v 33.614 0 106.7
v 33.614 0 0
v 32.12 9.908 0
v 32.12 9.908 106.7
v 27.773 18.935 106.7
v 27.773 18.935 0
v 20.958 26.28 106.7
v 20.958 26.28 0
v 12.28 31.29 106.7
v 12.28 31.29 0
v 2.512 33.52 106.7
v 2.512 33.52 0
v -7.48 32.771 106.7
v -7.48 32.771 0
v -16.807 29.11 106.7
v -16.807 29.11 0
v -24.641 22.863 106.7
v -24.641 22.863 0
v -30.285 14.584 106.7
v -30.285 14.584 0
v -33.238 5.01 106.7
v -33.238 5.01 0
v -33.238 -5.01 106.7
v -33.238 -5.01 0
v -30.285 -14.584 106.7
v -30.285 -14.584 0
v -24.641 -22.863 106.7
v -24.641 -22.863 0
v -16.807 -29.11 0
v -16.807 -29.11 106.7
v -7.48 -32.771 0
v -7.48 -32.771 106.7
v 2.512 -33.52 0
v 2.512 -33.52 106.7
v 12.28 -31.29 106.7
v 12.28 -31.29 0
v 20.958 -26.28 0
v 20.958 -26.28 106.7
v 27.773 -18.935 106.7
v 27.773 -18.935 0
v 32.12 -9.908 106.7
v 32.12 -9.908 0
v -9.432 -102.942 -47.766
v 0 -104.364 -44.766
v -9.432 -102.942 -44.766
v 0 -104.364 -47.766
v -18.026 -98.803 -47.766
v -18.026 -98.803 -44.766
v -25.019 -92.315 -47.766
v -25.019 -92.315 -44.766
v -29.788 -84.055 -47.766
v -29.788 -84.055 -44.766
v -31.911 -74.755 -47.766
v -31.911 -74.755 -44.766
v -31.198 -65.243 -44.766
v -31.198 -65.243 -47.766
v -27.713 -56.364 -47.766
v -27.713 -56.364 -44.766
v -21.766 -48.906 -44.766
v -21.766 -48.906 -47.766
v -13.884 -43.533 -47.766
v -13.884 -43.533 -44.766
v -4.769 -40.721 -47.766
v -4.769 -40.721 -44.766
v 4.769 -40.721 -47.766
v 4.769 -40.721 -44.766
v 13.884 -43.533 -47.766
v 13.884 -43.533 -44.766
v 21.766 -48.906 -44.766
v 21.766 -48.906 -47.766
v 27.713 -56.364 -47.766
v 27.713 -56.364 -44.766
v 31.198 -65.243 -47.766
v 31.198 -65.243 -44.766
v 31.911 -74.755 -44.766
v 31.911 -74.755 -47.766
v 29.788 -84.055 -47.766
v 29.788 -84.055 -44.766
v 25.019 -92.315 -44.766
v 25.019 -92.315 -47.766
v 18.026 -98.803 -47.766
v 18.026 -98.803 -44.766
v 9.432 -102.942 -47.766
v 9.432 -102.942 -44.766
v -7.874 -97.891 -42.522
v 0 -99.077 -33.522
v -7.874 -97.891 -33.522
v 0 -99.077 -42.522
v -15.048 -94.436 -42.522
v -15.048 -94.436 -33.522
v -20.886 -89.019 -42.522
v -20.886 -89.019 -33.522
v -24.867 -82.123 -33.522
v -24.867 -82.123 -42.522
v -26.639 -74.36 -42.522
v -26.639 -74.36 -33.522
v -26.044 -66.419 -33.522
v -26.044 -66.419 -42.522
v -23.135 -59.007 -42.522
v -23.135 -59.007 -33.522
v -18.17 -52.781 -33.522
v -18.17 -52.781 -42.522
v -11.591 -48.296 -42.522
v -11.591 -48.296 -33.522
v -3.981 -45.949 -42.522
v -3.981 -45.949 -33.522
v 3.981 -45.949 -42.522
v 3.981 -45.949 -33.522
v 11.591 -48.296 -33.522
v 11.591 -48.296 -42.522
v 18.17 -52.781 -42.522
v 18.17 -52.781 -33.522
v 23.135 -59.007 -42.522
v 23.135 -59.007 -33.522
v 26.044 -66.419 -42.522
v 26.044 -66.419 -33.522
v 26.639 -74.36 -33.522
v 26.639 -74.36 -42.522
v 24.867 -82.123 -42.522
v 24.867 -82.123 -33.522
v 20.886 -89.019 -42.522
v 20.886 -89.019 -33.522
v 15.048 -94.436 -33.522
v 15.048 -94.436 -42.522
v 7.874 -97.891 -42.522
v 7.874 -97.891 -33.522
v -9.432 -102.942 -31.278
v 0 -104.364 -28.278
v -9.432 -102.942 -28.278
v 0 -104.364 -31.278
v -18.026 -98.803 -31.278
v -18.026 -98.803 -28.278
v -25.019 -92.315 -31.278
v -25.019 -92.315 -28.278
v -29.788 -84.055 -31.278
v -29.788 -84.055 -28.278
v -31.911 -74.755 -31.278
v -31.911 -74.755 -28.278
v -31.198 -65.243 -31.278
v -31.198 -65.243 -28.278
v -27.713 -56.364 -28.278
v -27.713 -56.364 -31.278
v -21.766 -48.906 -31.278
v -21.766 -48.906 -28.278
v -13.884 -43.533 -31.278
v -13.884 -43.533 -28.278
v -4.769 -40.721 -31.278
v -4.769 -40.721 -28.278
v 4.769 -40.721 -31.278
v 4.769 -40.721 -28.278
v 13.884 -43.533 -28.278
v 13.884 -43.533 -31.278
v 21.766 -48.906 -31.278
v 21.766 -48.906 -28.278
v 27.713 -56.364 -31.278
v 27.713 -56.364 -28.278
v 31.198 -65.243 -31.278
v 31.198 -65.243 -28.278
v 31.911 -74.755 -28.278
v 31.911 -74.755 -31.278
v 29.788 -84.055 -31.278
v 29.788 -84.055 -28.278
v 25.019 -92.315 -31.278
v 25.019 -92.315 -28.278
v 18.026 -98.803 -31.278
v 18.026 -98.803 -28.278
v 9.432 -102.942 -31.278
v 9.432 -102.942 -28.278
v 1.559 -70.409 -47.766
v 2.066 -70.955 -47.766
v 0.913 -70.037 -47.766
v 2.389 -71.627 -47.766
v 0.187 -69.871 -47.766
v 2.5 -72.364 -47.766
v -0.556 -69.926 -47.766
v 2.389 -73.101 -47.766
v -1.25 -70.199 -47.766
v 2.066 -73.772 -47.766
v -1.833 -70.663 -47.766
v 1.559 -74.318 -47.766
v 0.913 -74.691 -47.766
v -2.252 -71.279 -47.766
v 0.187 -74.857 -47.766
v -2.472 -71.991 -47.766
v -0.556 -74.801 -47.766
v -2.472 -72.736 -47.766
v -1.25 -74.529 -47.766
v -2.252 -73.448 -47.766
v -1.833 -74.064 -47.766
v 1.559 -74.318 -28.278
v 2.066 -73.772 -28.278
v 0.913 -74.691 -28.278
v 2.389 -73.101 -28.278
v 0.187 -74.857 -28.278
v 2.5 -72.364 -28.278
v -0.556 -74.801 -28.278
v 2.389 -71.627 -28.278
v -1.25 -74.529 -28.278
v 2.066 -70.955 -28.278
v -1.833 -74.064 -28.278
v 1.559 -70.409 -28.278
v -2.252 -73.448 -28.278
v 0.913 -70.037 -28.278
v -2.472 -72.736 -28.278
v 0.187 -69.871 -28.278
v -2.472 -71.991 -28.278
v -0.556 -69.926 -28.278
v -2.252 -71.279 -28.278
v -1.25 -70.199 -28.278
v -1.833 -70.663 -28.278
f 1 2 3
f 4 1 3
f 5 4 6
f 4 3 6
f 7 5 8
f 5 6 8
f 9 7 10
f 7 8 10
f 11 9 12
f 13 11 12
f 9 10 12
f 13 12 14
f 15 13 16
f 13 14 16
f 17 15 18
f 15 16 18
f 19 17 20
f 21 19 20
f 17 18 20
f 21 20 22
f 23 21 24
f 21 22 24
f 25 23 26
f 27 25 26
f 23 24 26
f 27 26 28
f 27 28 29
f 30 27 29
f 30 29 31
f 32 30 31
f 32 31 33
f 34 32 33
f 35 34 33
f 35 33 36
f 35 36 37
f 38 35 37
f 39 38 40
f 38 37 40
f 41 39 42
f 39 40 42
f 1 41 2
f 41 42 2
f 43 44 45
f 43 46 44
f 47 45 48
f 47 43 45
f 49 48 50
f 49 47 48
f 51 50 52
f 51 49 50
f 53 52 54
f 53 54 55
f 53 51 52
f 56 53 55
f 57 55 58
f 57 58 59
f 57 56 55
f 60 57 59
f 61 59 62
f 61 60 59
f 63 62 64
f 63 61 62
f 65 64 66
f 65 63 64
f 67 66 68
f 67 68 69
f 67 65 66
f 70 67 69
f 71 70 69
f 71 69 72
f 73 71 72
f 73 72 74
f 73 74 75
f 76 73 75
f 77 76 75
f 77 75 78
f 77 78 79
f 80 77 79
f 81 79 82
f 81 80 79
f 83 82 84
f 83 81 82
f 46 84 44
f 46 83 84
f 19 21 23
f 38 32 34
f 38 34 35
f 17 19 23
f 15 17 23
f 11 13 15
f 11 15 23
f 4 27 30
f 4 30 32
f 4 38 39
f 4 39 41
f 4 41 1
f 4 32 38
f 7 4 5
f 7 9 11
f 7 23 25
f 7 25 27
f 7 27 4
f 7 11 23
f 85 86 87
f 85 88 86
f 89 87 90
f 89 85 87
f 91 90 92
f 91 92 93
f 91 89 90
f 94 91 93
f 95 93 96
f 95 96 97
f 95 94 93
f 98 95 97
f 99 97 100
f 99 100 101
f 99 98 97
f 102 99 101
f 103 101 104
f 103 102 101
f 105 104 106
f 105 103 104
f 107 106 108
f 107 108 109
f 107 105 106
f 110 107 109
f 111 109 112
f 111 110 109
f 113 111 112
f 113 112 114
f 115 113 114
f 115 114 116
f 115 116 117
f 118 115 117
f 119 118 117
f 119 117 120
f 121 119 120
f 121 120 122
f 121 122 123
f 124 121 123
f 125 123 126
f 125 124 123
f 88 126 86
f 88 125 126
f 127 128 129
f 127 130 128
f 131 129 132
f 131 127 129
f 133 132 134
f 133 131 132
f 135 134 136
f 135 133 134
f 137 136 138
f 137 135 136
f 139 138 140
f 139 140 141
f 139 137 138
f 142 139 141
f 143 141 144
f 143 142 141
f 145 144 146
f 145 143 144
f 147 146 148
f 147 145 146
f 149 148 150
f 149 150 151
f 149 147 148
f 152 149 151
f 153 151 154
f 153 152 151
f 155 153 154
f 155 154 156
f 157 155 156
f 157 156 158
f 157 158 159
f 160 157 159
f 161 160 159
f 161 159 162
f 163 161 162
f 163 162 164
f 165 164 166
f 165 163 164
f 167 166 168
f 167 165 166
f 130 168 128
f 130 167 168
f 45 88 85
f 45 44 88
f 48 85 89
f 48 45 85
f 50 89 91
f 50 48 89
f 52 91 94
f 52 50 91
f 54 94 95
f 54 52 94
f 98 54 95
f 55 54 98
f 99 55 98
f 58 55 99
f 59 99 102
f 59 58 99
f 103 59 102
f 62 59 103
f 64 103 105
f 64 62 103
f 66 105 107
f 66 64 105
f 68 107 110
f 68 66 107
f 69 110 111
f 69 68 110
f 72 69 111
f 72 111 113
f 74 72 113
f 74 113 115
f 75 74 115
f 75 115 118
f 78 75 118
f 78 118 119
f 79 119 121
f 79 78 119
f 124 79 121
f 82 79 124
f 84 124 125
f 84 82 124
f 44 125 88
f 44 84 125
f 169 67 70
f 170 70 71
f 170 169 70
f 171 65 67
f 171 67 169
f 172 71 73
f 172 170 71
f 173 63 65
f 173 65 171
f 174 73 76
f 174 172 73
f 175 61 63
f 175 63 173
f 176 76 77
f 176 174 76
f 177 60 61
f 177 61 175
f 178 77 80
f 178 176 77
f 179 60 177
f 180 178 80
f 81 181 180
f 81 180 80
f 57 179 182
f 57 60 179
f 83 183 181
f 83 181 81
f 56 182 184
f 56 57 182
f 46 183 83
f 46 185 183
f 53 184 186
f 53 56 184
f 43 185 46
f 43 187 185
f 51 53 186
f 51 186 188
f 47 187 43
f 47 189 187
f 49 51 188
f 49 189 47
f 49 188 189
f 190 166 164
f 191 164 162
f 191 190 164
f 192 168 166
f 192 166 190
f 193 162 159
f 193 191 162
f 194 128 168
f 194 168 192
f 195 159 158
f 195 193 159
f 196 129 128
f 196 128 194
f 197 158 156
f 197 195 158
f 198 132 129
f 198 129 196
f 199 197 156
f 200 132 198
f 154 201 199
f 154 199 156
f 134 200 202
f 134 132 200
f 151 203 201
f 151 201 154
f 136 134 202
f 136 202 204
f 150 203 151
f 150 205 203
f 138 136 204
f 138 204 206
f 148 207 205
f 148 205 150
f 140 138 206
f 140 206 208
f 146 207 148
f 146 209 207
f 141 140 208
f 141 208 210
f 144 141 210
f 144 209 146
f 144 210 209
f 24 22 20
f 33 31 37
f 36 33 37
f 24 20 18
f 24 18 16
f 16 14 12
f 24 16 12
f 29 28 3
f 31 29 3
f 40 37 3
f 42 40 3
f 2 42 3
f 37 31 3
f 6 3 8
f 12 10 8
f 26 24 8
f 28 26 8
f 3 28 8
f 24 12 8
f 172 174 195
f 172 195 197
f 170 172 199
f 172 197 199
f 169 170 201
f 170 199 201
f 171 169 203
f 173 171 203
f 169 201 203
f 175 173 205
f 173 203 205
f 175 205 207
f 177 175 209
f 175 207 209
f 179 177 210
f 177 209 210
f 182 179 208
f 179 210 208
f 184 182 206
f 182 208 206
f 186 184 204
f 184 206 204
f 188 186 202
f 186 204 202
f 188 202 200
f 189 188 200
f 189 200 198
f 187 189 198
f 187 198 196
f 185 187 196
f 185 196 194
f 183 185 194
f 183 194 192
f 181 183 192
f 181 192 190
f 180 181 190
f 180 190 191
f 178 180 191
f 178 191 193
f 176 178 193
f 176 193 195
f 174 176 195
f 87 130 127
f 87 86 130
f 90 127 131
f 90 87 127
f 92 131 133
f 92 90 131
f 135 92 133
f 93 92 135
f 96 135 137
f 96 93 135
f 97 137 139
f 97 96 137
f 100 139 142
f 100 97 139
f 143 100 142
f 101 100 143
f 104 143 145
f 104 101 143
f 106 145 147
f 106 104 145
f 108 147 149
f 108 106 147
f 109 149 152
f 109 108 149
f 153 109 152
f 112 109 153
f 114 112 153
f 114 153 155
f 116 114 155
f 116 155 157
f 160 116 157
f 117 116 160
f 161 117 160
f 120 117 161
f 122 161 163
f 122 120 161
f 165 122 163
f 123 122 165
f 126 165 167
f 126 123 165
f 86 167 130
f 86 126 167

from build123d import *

# Parameters (mm, degrees)
F0_R     = 33.613623
F1_DEPTH = 106.7
F4_R     = 2.5
F5_DEPTH = 27.2


with BuildPart() as f1:
    # F0 (on Top) → F1 (new body)
    with BuildSketch(Plane.XY):
        Circle(F0_R)
    extrude(amount=F1_DEPTH)


with BuildPart() as f3:
    # F2 (on Right) → F3 (revolve)
    with BuildSketch(Plane.YZ):
        Polygon((-72.363789, -28.278395), (-104.363789, -28.278395), (-104.363789, -31.278395), (-99.077389, -33.522339), (-99.077389, -42.522339), (-104.363788, -44.766282), (-104.363788, -47.766282), (-72.363789, -47.766282), align=None)
    revolve(axis=Axis((0, -72.363789, -38.022339), (0, 0, -1)))

    # F4 (on face) → F5 (cut)
    with BuildSketch(Plane.XY.offset(-28.278395)):
        with Locations((0, -72.363789)):
            Circle(F4_R)
    extrude(amount=-F5_DEPTH, mode=Mode.SUBTRACT)


solid = Compound([f1.part, f3.part])
